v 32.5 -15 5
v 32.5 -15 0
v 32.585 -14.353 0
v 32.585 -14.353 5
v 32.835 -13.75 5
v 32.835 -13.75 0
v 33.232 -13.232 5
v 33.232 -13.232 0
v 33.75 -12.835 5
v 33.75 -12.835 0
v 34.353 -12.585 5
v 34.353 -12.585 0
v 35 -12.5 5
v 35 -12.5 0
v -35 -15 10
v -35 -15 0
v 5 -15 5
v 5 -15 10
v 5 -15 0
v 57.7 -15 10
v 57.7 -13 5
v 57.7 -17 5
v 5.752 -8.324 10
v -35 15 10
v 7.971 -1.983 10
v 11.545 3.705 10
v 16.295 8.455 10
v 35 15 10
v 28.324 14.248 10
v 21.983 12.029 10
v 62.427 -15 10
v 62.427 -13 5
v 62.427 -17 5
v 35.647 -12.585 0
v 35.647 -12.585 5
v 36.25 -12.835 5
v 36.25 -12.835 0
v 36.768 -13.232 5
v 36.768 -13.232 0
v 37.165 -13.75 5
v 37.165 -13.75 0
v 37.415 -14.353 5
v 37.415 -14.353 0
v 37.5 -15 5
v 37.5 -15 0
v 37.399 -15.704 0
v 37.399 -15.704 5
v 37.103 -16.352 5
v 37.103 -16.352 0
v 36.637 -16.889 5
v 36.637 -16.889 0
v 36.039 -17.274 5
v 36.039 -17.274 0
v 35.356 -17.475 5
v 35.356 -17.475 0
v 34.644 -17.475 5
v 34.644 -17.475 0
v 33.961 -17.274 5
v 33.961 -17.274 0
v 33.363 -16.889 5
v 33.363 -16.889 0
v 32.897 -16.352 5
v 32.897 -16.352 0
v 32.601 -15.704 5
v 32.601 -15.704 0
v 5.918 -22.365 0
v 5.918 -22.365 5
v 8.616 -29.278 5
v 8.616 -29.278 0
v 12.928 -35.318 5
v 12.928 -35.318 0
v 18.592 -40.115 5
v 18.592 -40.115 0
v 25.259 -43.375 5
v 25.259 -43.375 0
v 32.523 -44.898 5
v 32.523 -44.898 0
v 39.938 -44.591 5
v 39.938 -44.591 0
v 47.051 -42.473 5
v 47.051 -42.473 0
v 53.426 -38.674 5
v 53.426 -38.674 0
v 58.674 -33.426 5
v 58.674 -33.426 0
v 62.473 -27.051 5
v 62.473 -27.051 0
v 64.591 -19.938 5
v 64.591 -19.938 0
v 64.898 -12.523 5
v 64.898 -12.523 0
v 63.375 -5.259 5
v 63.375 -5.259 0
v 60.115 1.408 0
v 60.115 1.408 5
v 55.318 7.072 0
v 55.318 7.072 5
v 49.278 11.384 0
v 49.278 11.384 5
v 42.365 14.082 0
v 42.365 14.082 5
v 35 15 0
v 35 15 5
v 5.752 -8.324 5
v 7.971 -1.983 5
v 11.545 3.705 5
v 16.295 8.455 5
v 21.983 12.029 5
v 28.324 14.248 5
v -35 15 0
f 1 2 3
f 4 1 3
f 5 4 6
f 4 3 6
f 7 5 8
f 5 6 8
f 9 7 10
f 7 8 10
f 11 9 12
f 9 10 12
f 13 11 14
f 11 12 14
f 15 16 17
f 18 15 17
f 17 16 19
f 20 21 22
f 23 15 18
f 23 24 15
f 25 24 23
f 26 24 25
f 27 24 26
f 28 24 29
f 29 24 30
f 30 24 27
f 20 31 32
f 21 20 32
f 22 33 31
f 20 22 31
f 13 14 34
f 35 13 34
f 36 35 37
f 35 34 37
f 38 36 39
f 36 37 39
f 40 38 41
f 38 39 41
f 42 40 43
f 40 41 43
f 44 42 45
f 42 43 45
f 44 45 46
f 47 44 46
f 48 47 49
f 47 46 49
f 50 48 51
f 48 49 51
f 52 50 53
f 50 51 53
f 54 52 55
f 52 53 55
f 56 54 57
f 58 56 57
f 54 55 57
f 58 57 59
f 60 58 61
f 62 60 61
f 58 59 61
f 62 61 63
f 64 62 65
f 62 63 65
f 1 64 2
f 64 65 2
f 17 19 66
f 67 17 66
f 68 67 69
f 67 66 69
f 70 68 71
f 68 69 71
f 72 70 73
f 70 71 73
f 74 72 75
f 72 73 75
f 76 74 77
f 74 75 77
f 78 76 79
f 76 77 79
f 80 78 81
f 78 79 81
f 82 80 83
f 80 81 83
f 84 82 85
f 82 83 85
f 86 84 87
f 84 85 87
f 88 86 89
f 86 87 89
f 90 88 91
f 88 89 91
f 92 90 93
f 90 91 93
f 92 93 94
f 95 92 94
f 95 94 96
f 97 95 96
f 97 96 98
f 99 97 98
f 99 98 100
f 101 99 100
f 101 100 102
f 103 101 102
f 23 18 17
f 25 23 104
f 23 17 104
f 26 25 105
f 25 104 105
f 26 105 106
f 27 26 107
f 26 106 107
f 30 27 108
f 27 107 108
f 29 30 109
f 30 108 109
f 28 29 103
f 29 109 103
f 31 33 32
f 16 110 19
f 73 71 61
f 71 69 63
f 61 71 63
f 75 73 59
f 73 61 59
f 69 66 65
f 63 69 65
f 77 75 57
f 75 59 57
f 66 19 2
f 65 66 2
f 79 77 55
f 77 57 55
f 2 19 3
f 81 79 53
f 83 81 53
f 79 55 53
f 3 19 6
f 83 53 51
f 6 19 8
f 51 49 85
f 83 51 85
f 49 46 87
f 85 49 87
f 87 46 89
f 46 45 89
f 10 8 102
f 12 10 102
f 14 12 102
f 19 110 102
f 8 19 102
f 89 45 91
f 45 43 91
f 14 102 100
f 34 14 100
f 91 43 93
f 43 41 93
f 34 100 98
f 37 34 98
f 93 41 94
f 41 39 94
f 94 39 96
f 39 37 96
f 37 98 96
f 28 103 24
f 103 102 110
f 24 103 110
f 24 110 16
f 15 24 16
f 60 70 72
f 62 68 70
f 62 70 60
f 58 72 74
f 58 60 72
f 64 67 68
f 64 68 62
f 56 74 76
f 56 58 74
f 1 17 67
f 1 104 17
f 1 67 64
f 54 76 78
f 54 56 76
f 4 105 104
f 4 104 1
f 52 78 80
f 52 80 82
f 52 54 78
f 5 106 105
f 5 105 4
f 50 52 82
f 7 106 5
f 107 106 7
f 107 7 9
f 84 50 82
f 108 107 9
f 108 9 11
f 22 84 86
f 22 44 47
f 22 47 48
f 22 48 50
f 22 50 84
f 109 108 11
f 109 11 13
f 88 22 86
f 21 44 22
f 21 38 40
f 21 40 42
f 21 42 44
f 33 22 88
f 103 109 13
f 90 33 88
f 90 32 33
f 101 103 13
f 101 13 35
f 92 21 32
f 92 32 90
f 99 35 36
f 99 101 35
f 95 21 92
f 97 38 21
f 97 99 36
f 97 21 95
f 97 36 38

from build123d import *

# Parameters (mm, degrees)
F1_DEPTH = 10
F2_DEPTH = 5
F3_W     = 4.9271763038
F3_H     = 2
F4_DEPTH = 5
F6_DEPTH = 4.9271763038
F7_DEPTH = 0.2
F8_DEPTH = 0.2


with BuildPart() as f1:
    # F0 (on Top) → F1 (new body)
    with BuildSketch(Plane.XY):
        with BuildLine():
            Line((-35, -15), (5, -15))
            ThreePointArc((5, -15), (13.7867965644, 6.2132034356), (35, 15))
            Line((35, 15), (-35, 15))
            Line((-35, 15), (-35, -15))
        make_face()
    extrude(amount=F1_DEPTH)

    # F0 (on Top) → F2 (join)
    with BuildSketch(Plane.XY):
        with BuildLine():
            Line((5, -15), (7.5, -15))
            ThreePointArc((7.5, -15), (15.5545635174, 4.4454364826), (35, 12.5))
            Line((35, 12.5), (35, 15))
            ThreePointArc((35, 15), (13.7867965644, 6.2132034356), (5, -15))
        make_face()
        with BuildLine():
            Line((7.5, -15), (12.5, -15))
            ThreePointArc((12.5, -15), (19.0900974233, 0.9099025767), (35, 7.5))
            Line((35, 7.5), (35, 12.5))
            ThreePointArc((35, 12.5), (15.5545635174, 4.4454364826), (7.5, -15))
        make_face()
        with BuildLine():
            ThreePointArc((62.5, -15), (35, -42.5), (7.5, -15))
            Line((7.5, -15), (5, -15))
            ThreePointArc((5, -15), (35, -45), (65, -15))
            ThreePointArc((65, -15), (56.2132034356, 6.2132034356), (35, 15))
            Line((35, 15), (35, 12.5))
            ThreePointArc((35, 12.5), (54.4454364826, 4.4454364826), (62.5, -15))
        make_face()
        with BuildLine():
            ThreePointArc((57.5, -15), (35, -37.5), (12.5, -15))
            Line((12.5, -15), (7.5, -15))
            ThreePointArc((7.5, -15), (35, -42.5), (62.5, -15))
            ThreePointArc((62.5, -15), (54.4454364826, 4.4454364826), (35, 12.5))
            Line((35, 12.5), (35, 7.5))
            ThreePointArc((35, 7.5), (50.9099025767, 0.9099025767), (57.5, -15))
        make_face()
        with BuildLine():
            Line((12.5, -15), (32.5, -15))
            ThreePointArc((32.5, -15), (33.232233047, -13.232233047), (35, -12.5))
            Line((35, -12.5), (35, 7.5))
            ThreePointArc((35, 7.5), (19.0900974233, 0.9099025767), (12.5, -15))
        make_face()
        with BuildLine():
            ThreePointArc((37.5, -15), (35, -17.5), (32.5, -15))
            Line((32.5, -15), (12.5, -15))
            ThreePointArc((12.5, -15), (35, -37.5), (57.5, -15))
            ThreePointArc((57.5, -15), (50.9099025767, 0.9099025767), (35, 7.5))
            Line((35, 7.5), (35, -12.5))
            ThreePointArc((35, -12.5), (36.767766953, -13.232233047), (37.5, -15))
        make_face()
    extrude(amount=F2_DEPTH)

    # F3 (on face) → F4 (join, through all)
    with BuildSketch(Plane.XY.offset(5)):
        with Locations((59.9635881519, -14)):
            Rectangle(F3_W, F3_H)
        with Locations((59.9635881519, -16)):
            Rectangle(F3_W, F3_H)
    extrude(amount=F4_DEPTH)

    # F5 (on face) → F6 (cut, through all)
    with BuildSketch(Plane.YZ.offset(62.4271763038)):
        Polygon((-17, 10), (-17, 5), (-15, 10), align=None)
        Polygon((-13, 10), (-15, 10), (-13, 5), align=None)
    extrude(amount=-F6_DEPTH, mode=Mode.SUBTRACT)

    # F7 (cut): a face of the model
    f7_faces = [f1.faces().sort_by_distance(p)[0] for p in [
        (62.4271763038, -15, 6.6666666667),
    ]]
    extrude(f7_faces, amount=F7_DEPTH, mode=Mode.SUBTRACT)

    # F8 (cut): a face of the model
    f8_faces = [f1.faces().sort_by_distance(p)[0] for p in [
        (57.5, -15, 6.6666666667),
    ]]
    extrude(f8_faces, amount=-F8_DEPTH, mode=Mode.SUBTRACT)


solid = f1.part
